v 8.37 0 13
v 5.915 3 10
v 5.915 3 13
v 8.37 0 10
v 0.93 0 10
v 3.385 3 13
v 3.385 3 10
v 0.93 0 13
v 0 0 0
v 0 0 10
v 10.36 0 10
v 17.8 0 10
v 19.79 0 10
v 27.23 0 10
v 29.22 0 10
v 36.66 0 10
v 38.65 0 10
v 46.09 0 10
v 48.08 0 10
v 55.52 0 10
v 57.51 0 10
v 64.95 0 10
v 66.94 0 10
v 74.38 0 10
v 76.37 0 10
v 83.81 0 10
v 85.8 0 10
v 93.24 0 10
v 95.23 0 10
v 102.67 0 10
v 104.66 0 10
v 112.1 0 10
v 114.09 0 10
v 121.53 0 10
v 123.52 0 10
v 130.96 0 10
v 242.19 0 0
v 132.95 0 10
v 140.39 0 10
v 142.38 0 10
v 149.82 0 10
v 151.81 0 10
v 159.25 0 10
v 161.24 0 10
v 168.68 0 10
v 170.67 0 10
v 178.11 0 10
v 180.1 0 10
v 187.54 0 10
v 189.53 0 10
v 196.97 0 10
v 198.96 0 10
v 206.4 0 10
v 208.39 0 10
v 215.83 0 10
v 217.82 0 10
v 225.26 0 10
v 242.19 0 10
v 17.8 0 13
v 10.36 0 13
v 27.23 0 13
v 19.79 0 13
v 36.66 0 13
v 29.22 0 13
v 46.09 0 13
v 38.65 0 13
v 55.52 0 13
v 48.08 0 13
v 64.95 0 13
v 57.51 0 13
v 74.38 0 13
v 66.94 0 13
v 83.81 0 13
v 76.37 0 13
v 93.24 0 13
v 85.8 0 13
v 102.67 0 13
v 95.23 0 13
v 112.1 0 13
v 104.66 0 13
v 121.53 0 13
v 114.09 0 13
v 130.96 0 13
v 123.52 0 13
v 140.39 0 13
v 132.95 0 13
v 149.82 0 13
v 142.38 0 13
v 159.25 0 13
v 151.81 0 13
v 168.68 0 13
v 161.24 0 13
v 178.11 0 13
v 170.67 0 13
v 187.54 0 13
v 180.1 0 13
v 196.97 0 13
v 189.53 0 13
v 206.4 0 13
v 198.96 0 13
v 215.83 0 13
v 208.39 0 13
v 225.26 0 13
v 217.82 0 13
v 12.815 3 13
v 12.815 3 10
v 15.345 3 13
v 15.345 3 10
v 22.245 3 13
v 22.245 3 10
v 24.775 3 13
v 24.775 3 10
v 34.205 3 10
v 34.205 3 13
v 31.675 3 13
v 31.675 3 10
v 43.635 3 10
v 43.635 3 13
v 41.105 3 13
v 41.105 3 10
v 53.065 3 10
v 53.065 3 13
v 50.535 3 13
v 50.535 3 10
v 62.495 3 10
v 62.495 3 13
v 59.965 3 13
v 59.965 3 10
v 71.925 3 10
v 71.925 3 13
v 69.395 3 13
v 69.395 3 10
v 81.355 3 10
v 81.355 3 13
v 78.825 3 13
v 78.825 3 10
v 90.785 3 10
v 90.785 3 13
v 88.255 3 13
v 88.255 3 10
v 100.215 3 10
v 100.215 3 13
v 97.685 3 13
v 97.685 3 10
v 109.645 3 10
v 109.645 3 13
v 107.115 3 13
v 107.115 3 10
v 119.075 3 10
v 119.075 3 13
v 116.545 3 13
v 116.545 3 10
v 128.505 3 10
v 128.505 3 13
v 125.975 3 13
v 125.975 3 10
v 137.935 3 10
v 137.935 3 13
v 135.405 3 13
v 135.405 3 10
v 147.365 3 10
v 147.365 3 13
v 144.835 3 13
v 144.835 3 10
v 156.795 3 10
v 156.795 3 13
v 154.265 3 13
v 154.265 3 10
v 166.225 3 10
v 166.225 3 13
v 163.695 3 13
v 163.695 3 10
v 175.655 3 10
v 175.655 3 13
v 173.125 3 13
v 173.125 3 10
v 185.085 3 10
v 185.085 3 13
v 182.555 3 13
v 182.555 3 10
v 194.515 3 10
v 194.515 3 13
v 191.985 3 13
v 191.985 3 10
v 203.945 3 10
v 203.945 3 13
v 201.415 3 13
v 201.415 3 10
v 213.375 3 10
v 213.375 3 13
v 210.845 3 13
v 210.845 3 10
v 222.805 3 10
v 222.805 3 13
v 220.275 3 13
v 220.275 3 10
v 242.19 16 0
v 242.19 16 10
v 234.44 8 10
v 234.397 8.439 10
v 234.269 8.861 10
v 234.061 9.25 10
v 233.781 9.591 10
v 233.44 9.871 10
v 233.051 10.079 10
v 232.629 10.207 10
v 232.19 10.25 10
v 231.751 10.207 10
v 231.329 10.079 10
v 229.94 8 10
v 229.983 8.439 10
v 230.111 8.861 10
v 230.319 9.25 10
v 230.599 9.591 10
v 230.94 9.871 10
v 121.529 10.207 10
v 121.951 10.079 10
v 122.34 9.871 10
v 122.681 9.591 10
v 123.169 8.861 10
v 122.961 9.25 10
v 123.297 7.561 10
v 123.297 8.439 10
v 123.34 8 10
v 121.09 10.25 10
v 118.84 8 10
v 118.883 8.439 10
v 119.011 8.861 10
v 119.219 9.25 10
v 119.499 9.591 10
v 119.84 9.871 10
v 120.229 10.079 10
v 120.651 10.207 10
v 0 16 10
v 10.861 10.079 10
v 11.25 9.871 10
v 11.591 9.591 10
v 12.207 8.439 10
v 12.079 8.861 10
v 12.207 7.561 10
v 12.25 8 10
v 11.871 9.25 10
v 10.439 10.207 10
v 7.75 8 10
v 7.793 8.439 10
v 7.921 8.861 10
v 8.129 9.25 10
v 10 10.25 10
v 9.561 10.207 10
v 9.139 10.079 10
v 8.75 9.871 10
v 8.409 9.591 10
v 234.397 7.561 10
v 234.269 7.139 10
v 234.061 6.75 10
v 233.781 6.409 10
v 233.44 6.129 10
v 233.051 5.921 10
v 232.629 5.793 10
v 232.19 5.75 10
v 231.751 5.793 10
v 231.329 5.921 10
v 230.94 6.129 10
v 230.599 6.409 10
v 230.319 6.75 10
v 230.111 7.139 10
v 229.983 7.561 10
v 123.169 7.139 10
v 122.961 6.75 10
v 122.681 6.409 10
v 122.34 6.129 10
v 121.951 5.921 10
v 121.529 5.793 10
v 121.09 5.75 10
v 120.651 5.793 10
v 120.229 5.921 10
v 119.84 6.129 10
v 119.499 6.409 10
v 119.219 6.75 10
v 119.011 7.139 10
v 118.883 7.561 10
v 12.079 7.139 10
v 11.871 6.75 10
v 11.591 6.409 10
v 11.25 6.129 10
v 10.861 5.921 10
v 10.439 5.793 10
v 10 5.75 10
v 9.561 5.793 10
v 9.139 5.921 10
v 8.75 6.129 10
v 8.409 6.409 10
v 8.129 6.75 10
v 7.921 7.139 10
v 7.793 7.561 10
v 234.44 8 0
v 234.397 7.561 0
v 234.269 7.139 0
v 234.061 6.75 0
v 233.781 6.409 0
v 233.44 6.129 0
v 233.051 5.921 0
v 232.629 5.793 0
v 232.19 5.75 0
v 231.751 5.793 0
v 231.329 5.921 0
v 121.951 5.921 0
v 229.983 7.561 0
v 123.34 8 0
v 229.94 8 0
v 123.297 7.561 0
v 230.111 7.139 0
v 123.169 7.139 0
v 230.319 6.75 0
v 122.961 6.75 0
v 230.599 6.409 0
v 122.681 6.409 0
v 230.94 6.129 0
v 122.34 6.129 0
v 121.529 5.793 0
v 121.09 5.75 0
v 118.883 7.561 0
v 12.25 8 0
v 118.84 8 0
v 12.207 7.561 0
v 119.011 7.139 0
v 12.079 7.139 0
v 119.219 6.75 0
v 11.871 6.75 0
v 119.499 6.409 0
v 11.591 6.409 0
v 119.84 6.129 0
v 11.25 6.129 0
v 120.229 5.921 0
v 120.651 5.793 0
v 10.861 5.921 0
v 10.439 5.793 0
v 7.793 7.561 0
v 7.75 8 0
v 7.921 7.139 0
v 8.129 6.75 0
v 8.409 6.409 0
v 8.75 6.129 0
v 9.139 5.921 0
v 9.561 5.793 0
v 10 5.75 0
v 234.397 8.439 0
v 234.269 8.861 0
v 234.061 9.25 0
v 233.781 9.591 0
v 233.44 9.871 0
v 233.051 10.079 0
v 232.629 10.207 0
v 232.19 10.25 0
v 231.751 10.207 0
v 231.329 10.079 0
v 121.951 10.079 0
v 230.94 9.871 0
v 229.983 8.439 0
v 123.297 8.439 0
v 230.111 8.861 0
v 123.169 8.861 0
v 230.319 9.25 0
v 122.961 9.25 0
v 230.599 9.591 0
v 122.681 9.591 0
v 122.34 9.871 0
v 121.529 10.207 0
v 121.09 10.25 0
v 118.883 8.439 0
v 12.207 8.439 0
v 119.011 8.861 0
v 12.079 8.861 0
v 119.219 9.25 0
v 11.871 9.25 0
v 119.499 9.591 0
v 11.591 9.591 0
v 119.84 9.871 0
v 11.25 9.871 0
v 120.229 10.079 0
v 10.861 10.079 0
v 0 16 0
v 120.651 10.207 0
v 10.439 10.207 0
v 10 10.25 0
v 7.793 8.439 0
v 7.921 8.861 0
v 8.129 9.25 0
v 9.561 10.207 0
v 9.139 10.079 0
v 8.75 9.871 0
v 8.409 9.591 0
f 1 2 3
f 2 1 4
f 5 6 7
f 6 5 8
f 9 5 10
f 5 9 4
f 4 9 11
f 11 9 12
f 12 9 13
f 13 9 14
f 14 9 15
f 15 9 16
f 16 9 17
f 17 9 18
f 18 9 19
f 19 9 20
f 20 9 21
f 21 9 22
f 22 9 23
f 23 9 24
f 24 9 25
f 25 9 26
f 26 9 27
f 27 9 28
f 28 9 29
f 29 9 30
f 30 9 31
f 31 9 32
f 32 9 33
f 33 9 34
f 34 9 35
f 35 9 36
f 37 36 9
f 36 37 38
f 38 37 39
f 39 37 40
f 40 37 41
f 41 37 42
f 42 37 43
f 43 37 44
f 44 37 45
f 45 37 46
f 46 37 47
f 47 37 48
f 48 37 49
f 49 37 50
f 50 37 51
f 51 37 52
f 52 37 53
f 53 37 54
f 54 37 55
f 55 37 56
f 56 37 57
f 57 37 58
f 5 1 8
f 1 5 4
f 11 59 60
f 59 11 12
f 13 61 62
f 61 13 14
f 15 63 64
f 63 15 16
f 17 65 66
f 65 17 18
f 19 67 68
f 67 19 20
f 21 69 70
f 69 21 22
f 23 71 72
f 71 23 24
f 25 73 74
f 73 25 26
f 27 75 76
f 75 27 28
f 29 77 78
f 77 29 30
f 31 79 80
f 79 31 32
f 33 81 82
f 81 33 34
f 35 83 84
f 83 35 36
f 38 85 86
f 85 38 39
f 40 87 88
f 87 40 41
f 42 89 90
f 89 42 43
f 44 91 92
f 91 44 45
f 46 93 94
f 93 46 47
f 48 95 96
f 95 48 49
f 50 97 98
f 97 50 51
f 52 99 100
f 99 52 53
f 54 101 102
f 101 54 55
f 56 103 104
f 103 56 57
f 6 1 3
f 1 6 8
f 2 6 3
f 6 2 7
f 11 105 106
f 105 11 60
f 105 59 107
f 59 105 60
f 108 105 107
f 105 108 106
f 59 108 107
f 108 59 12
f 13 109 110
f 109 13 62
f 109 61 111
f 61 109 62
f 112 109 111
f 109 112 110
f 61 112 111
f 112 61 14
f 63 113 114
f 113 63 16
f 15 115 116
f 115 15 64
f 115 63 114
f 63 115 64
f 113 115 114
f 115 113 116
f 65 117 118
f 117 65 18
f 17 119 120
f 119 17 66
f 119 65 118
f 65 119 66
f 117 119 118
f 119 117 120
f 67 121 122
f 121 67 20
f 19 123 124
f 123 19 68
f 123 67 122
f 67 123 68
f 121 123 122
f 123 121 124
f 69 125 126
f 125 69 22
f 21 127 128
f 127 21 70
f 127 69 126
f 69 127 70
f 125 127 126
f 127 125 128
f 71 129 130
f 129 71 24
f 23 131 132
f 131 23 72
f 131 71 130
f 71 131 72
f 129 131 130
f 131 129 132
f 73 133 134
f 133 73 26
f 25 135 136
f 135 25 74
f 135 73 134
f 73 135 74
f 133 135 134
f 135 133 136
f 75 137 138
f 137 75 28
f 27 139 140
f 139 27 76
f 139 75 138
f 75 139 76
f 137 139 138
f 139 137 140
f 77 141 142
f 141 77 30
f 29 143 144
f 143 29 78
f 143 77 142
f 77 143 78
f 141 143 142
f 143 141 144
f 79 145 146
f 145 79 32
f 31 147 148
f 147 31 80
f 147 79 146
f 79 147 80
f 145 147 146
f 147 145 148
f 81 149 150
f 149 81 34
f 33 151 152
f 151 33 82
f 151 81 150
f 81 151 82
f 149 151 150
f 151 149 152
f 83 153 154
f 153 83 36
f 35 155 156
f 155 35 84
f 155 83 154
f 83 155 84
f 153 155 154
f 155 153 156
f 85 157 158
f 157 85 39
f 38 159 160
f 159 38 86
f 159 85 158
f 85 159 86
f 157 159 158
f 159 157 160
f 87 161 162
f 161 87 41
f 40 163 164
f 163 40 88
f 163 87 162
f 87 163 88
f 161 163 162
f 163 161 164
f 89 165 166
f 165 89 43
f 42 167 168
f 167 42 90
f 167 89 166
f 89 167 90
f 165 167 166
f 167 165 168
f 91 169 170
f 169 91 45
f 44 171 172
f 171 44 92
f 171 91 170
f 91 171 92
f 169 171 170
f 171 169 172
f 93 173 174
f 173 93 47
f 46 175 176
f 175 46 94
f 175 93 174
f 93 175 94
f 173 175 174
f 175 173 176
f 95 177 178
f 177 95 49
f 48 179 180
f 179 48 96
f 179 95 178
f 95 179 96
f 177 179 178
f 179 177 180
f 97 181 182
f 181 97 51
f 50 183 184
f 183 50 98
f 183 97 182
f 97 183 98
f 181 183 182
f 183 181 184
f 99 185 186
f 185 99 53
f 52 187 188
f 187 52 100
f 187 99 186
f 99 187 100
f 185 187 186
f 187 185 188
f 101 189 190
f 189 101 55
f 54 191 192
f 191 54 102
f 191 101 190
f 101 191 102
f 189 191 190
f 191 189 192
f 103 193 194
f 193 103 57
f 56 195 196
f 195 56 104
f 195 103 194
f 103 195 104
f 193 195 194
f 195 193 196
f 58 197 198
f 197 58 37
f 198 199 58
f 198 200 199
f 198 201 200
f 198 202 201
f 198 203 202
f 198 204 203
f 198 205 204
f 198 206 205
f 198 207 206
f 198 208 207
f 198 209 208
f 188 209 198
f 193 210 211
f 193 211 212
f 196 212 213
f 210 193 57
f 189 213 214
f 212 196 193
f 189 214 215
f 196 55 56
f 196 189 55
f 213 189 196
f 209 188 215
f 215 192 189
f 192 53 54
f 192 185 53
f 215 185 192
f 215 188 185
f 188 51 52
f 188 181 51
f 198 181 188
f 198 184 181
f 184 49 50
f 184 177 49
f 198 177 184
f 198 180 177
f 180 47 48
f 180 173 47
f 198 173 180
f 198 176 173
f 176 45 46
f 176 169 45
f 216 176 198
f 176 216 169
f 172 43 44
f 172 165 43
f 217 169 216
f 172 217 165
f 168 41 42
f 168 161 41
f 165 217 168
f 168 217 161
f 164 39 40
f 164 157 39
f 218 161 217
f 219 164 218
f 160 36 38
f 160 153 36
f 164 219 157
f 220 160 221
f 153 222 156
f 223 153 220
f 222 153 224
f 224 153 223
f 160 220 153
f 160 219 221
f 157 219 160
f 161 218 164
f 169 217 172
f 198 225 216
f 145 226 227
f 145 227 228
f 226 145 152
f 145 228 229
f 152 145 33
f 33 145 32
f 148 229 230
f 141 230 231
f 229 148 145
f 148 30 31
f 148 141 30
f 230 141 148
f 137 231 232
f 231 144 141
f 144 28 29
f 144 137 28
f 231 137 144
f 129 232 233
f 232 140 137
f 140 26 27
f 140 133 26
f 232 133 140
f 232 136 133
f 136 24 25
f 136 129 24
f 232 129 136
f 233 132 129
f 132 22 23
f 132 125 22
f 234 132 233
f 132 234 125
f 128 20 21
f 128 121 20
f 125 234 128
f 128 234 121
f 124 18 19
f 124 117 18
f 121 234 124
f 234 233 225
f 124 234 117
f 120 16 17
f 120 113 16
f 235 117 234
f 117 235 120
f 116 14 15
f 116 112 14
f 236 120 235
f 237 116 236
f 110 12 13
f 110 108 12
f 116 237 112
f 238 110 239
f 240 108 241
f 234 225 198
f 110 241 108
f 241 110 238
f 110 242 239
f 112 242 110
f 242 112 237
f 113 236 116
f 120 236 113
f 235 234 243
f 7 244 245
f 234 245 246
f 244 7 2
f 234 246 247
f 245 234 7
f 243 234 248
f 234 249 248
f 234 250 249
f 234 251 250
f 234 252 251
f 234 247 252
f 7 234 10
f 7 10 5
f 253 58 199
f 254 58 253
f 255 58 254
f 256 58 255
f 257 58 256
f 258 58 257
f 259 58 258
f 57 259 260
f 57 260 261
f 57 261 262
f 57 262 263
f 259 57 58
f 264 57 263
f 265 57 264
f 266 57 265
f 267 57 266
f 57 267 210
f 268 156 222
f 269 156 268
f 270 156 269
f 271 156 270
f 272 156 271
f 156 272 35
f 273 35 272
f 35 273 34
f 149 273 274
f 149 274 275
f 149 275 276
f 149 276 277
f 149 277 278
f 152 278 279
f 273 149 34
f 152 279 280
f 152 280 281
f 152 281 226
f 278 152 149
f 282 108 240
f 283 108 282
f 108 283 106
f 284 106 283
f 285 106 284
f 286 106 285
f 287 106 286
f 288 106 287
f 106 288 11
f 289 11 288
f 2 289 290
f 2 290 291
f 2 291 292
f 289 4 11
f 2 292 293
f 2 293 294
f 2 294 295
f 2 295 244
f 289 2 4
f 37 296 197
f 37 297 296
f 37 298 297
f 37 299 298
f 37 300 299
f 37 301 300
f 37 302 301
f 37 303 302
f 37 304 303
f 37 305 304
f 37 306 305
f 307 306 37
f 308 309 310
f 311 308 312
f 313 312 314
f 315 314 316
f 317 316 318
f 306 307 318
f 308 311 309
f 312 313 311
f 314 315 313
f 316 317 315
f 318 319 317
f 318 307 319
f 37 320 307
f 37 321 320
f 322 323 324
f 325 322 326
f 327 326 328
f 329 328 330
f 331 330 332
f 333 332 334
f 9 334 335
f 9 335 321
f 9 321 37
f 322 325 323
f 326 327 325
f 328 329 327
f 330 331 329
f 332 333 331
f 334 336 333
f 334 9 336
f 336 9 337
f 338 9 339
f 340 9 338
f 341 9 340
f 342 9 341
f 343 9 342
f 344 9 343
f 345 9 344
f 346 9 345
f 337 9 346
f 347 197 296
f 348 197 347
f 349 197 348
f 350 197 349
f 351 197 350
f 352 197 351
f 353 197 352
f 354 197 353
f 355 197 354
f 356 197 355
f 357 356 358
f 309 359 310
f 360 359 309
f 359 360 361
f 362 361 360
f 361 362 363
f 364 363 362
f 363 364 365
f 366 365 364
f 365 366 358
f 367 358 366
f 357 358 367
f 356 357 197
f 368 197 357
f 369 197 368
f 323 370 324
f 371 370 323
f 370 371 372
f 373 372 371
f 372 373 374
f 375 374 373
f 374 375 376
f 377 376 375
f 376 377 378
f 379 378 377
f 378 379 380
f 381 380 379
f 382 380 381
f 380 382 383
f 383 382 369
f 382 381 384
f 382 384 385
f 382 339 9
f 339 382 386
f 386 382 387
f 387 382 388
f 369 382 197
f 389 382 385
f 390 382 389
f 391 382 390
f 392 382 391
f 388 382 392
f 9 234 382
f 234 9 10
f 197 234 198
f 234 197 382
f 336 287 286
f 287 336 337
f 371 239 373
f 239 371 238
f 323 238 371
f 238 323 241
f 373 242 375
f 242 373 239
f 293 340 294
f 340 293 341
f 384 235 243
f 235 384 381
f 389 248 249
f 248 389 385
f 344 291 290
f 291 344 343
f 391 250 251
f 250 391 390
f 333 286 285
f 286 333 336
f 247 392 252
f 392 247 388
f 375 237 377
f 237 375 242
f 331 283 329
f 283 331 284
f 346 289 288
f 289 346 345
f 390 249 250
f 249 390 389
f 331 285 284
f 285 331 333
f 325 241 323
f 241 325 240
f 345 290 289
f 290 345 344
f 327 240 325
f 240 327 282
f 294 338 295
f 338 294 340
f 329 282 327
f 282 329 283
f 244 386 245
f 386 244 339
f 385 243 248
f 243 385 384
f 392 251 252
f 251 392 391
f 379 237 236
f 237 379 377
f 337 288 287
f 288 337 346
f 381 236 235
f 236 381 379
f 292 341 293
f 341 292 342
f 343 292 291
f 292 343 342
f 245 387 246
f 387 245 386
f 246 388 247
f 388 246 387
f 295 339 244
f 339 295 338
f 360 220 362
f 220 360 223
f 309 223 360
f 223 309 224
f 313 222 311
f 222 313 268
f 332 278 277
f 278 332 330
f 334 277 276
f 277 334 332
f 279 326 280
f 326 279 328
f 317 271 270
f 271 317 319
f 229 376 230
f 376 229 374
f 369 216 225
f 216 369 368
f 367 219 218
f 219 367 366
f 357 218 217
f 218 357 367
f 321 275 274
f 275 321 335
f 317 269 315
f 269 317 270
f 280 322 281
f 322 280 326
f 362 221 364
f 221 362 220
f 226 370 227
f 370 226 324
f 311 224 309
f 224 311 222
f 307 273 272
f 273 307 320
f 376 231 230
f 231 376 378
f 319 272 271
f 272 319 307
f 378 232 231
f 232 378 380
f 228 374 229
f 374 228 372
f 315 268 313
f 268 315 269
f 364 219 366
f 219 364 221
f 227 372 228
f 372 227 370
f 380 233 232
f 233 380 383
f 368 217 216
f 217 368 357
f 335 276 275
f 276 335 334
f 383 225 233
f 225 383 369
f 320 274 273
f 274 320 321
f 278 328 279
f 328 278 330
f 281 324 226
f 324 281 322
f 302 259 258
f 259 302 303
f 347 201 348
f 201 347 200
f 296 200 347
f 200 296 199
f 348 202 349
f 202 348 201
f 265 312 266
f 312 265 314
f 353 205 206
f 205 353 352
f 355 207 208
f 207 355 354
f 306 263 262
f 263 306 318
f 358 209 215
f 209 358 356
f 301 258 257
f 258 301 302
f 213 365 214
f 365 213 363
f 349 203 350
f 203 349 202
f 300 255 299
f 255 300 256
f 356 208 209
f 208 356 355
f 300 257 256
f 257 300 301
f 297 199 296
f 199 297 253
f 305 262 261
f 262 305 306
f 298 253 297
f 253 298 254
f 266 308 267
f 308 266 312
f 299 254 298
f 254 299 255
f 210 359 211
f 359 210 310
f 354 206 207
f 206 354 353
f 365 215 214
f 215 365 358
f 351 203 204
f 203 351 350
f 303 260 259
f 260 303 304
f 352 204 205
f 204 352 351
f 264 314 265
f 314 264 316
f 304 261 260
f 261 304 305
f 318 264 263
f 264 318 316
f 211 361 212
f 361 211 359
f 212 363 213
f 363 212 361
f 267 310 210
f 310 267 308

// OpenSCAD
$fn = 32;

// ----------------------------------------------------------------------
// Gear rack: m=3 z=24, 242.19 x 16 x 13 mm
// ----------------------------------------------------------------------

// --- parameters (mm) ---
bar_len = 242.19;         // rack length, X
bar_w = 16;               // rack width, Y
bar_h = 13;               // overall height, Z
gear_module = 3;          // module
base_t = 10;              // tooth root line height
pitch = 9.43;             // circular pitch
tip_w = 2.53;             // tooth thickness at the tip
root_w = 7.44;            // tooth thickness at the root line
hole_d = 4.5;             // mounting hole
sink = 0.6;               // tooth root overlap into the body

tooth_span = 226.19;

module tooth(x0) {
  /* 20 deg flank profile, sunk into the body for a positive overlap */
  translate([x0, 0, base_t - sink])
    linear_extrude(height = bar_h - base_t + sink)
      polygon(points = [[-root_w / 2, 0], [root_w / 2, 0],
                        [tip_w / 2, bar_h - base_t],
                        [-tip_w / 2, bar_h - base_t]]);
}

difference() {
  union() {
    cube([bar_len, bar_w, base_t]);
    for (i = [0 : 24 - 1])
      tooth((i + 0.5) * pitch + (tooth_span - 24 * pitch) / 2);
  }
  translate([10, 8, -1]) cylinder(h = base_t + 2, d = hole_d);
  translate([121.09, 8, -1]) cylinder(h = base_t + 2, d = hole_d);
  translate([232.19, 8, -1]) cylinder(h = base_t + 2, d = hole_d);
}
